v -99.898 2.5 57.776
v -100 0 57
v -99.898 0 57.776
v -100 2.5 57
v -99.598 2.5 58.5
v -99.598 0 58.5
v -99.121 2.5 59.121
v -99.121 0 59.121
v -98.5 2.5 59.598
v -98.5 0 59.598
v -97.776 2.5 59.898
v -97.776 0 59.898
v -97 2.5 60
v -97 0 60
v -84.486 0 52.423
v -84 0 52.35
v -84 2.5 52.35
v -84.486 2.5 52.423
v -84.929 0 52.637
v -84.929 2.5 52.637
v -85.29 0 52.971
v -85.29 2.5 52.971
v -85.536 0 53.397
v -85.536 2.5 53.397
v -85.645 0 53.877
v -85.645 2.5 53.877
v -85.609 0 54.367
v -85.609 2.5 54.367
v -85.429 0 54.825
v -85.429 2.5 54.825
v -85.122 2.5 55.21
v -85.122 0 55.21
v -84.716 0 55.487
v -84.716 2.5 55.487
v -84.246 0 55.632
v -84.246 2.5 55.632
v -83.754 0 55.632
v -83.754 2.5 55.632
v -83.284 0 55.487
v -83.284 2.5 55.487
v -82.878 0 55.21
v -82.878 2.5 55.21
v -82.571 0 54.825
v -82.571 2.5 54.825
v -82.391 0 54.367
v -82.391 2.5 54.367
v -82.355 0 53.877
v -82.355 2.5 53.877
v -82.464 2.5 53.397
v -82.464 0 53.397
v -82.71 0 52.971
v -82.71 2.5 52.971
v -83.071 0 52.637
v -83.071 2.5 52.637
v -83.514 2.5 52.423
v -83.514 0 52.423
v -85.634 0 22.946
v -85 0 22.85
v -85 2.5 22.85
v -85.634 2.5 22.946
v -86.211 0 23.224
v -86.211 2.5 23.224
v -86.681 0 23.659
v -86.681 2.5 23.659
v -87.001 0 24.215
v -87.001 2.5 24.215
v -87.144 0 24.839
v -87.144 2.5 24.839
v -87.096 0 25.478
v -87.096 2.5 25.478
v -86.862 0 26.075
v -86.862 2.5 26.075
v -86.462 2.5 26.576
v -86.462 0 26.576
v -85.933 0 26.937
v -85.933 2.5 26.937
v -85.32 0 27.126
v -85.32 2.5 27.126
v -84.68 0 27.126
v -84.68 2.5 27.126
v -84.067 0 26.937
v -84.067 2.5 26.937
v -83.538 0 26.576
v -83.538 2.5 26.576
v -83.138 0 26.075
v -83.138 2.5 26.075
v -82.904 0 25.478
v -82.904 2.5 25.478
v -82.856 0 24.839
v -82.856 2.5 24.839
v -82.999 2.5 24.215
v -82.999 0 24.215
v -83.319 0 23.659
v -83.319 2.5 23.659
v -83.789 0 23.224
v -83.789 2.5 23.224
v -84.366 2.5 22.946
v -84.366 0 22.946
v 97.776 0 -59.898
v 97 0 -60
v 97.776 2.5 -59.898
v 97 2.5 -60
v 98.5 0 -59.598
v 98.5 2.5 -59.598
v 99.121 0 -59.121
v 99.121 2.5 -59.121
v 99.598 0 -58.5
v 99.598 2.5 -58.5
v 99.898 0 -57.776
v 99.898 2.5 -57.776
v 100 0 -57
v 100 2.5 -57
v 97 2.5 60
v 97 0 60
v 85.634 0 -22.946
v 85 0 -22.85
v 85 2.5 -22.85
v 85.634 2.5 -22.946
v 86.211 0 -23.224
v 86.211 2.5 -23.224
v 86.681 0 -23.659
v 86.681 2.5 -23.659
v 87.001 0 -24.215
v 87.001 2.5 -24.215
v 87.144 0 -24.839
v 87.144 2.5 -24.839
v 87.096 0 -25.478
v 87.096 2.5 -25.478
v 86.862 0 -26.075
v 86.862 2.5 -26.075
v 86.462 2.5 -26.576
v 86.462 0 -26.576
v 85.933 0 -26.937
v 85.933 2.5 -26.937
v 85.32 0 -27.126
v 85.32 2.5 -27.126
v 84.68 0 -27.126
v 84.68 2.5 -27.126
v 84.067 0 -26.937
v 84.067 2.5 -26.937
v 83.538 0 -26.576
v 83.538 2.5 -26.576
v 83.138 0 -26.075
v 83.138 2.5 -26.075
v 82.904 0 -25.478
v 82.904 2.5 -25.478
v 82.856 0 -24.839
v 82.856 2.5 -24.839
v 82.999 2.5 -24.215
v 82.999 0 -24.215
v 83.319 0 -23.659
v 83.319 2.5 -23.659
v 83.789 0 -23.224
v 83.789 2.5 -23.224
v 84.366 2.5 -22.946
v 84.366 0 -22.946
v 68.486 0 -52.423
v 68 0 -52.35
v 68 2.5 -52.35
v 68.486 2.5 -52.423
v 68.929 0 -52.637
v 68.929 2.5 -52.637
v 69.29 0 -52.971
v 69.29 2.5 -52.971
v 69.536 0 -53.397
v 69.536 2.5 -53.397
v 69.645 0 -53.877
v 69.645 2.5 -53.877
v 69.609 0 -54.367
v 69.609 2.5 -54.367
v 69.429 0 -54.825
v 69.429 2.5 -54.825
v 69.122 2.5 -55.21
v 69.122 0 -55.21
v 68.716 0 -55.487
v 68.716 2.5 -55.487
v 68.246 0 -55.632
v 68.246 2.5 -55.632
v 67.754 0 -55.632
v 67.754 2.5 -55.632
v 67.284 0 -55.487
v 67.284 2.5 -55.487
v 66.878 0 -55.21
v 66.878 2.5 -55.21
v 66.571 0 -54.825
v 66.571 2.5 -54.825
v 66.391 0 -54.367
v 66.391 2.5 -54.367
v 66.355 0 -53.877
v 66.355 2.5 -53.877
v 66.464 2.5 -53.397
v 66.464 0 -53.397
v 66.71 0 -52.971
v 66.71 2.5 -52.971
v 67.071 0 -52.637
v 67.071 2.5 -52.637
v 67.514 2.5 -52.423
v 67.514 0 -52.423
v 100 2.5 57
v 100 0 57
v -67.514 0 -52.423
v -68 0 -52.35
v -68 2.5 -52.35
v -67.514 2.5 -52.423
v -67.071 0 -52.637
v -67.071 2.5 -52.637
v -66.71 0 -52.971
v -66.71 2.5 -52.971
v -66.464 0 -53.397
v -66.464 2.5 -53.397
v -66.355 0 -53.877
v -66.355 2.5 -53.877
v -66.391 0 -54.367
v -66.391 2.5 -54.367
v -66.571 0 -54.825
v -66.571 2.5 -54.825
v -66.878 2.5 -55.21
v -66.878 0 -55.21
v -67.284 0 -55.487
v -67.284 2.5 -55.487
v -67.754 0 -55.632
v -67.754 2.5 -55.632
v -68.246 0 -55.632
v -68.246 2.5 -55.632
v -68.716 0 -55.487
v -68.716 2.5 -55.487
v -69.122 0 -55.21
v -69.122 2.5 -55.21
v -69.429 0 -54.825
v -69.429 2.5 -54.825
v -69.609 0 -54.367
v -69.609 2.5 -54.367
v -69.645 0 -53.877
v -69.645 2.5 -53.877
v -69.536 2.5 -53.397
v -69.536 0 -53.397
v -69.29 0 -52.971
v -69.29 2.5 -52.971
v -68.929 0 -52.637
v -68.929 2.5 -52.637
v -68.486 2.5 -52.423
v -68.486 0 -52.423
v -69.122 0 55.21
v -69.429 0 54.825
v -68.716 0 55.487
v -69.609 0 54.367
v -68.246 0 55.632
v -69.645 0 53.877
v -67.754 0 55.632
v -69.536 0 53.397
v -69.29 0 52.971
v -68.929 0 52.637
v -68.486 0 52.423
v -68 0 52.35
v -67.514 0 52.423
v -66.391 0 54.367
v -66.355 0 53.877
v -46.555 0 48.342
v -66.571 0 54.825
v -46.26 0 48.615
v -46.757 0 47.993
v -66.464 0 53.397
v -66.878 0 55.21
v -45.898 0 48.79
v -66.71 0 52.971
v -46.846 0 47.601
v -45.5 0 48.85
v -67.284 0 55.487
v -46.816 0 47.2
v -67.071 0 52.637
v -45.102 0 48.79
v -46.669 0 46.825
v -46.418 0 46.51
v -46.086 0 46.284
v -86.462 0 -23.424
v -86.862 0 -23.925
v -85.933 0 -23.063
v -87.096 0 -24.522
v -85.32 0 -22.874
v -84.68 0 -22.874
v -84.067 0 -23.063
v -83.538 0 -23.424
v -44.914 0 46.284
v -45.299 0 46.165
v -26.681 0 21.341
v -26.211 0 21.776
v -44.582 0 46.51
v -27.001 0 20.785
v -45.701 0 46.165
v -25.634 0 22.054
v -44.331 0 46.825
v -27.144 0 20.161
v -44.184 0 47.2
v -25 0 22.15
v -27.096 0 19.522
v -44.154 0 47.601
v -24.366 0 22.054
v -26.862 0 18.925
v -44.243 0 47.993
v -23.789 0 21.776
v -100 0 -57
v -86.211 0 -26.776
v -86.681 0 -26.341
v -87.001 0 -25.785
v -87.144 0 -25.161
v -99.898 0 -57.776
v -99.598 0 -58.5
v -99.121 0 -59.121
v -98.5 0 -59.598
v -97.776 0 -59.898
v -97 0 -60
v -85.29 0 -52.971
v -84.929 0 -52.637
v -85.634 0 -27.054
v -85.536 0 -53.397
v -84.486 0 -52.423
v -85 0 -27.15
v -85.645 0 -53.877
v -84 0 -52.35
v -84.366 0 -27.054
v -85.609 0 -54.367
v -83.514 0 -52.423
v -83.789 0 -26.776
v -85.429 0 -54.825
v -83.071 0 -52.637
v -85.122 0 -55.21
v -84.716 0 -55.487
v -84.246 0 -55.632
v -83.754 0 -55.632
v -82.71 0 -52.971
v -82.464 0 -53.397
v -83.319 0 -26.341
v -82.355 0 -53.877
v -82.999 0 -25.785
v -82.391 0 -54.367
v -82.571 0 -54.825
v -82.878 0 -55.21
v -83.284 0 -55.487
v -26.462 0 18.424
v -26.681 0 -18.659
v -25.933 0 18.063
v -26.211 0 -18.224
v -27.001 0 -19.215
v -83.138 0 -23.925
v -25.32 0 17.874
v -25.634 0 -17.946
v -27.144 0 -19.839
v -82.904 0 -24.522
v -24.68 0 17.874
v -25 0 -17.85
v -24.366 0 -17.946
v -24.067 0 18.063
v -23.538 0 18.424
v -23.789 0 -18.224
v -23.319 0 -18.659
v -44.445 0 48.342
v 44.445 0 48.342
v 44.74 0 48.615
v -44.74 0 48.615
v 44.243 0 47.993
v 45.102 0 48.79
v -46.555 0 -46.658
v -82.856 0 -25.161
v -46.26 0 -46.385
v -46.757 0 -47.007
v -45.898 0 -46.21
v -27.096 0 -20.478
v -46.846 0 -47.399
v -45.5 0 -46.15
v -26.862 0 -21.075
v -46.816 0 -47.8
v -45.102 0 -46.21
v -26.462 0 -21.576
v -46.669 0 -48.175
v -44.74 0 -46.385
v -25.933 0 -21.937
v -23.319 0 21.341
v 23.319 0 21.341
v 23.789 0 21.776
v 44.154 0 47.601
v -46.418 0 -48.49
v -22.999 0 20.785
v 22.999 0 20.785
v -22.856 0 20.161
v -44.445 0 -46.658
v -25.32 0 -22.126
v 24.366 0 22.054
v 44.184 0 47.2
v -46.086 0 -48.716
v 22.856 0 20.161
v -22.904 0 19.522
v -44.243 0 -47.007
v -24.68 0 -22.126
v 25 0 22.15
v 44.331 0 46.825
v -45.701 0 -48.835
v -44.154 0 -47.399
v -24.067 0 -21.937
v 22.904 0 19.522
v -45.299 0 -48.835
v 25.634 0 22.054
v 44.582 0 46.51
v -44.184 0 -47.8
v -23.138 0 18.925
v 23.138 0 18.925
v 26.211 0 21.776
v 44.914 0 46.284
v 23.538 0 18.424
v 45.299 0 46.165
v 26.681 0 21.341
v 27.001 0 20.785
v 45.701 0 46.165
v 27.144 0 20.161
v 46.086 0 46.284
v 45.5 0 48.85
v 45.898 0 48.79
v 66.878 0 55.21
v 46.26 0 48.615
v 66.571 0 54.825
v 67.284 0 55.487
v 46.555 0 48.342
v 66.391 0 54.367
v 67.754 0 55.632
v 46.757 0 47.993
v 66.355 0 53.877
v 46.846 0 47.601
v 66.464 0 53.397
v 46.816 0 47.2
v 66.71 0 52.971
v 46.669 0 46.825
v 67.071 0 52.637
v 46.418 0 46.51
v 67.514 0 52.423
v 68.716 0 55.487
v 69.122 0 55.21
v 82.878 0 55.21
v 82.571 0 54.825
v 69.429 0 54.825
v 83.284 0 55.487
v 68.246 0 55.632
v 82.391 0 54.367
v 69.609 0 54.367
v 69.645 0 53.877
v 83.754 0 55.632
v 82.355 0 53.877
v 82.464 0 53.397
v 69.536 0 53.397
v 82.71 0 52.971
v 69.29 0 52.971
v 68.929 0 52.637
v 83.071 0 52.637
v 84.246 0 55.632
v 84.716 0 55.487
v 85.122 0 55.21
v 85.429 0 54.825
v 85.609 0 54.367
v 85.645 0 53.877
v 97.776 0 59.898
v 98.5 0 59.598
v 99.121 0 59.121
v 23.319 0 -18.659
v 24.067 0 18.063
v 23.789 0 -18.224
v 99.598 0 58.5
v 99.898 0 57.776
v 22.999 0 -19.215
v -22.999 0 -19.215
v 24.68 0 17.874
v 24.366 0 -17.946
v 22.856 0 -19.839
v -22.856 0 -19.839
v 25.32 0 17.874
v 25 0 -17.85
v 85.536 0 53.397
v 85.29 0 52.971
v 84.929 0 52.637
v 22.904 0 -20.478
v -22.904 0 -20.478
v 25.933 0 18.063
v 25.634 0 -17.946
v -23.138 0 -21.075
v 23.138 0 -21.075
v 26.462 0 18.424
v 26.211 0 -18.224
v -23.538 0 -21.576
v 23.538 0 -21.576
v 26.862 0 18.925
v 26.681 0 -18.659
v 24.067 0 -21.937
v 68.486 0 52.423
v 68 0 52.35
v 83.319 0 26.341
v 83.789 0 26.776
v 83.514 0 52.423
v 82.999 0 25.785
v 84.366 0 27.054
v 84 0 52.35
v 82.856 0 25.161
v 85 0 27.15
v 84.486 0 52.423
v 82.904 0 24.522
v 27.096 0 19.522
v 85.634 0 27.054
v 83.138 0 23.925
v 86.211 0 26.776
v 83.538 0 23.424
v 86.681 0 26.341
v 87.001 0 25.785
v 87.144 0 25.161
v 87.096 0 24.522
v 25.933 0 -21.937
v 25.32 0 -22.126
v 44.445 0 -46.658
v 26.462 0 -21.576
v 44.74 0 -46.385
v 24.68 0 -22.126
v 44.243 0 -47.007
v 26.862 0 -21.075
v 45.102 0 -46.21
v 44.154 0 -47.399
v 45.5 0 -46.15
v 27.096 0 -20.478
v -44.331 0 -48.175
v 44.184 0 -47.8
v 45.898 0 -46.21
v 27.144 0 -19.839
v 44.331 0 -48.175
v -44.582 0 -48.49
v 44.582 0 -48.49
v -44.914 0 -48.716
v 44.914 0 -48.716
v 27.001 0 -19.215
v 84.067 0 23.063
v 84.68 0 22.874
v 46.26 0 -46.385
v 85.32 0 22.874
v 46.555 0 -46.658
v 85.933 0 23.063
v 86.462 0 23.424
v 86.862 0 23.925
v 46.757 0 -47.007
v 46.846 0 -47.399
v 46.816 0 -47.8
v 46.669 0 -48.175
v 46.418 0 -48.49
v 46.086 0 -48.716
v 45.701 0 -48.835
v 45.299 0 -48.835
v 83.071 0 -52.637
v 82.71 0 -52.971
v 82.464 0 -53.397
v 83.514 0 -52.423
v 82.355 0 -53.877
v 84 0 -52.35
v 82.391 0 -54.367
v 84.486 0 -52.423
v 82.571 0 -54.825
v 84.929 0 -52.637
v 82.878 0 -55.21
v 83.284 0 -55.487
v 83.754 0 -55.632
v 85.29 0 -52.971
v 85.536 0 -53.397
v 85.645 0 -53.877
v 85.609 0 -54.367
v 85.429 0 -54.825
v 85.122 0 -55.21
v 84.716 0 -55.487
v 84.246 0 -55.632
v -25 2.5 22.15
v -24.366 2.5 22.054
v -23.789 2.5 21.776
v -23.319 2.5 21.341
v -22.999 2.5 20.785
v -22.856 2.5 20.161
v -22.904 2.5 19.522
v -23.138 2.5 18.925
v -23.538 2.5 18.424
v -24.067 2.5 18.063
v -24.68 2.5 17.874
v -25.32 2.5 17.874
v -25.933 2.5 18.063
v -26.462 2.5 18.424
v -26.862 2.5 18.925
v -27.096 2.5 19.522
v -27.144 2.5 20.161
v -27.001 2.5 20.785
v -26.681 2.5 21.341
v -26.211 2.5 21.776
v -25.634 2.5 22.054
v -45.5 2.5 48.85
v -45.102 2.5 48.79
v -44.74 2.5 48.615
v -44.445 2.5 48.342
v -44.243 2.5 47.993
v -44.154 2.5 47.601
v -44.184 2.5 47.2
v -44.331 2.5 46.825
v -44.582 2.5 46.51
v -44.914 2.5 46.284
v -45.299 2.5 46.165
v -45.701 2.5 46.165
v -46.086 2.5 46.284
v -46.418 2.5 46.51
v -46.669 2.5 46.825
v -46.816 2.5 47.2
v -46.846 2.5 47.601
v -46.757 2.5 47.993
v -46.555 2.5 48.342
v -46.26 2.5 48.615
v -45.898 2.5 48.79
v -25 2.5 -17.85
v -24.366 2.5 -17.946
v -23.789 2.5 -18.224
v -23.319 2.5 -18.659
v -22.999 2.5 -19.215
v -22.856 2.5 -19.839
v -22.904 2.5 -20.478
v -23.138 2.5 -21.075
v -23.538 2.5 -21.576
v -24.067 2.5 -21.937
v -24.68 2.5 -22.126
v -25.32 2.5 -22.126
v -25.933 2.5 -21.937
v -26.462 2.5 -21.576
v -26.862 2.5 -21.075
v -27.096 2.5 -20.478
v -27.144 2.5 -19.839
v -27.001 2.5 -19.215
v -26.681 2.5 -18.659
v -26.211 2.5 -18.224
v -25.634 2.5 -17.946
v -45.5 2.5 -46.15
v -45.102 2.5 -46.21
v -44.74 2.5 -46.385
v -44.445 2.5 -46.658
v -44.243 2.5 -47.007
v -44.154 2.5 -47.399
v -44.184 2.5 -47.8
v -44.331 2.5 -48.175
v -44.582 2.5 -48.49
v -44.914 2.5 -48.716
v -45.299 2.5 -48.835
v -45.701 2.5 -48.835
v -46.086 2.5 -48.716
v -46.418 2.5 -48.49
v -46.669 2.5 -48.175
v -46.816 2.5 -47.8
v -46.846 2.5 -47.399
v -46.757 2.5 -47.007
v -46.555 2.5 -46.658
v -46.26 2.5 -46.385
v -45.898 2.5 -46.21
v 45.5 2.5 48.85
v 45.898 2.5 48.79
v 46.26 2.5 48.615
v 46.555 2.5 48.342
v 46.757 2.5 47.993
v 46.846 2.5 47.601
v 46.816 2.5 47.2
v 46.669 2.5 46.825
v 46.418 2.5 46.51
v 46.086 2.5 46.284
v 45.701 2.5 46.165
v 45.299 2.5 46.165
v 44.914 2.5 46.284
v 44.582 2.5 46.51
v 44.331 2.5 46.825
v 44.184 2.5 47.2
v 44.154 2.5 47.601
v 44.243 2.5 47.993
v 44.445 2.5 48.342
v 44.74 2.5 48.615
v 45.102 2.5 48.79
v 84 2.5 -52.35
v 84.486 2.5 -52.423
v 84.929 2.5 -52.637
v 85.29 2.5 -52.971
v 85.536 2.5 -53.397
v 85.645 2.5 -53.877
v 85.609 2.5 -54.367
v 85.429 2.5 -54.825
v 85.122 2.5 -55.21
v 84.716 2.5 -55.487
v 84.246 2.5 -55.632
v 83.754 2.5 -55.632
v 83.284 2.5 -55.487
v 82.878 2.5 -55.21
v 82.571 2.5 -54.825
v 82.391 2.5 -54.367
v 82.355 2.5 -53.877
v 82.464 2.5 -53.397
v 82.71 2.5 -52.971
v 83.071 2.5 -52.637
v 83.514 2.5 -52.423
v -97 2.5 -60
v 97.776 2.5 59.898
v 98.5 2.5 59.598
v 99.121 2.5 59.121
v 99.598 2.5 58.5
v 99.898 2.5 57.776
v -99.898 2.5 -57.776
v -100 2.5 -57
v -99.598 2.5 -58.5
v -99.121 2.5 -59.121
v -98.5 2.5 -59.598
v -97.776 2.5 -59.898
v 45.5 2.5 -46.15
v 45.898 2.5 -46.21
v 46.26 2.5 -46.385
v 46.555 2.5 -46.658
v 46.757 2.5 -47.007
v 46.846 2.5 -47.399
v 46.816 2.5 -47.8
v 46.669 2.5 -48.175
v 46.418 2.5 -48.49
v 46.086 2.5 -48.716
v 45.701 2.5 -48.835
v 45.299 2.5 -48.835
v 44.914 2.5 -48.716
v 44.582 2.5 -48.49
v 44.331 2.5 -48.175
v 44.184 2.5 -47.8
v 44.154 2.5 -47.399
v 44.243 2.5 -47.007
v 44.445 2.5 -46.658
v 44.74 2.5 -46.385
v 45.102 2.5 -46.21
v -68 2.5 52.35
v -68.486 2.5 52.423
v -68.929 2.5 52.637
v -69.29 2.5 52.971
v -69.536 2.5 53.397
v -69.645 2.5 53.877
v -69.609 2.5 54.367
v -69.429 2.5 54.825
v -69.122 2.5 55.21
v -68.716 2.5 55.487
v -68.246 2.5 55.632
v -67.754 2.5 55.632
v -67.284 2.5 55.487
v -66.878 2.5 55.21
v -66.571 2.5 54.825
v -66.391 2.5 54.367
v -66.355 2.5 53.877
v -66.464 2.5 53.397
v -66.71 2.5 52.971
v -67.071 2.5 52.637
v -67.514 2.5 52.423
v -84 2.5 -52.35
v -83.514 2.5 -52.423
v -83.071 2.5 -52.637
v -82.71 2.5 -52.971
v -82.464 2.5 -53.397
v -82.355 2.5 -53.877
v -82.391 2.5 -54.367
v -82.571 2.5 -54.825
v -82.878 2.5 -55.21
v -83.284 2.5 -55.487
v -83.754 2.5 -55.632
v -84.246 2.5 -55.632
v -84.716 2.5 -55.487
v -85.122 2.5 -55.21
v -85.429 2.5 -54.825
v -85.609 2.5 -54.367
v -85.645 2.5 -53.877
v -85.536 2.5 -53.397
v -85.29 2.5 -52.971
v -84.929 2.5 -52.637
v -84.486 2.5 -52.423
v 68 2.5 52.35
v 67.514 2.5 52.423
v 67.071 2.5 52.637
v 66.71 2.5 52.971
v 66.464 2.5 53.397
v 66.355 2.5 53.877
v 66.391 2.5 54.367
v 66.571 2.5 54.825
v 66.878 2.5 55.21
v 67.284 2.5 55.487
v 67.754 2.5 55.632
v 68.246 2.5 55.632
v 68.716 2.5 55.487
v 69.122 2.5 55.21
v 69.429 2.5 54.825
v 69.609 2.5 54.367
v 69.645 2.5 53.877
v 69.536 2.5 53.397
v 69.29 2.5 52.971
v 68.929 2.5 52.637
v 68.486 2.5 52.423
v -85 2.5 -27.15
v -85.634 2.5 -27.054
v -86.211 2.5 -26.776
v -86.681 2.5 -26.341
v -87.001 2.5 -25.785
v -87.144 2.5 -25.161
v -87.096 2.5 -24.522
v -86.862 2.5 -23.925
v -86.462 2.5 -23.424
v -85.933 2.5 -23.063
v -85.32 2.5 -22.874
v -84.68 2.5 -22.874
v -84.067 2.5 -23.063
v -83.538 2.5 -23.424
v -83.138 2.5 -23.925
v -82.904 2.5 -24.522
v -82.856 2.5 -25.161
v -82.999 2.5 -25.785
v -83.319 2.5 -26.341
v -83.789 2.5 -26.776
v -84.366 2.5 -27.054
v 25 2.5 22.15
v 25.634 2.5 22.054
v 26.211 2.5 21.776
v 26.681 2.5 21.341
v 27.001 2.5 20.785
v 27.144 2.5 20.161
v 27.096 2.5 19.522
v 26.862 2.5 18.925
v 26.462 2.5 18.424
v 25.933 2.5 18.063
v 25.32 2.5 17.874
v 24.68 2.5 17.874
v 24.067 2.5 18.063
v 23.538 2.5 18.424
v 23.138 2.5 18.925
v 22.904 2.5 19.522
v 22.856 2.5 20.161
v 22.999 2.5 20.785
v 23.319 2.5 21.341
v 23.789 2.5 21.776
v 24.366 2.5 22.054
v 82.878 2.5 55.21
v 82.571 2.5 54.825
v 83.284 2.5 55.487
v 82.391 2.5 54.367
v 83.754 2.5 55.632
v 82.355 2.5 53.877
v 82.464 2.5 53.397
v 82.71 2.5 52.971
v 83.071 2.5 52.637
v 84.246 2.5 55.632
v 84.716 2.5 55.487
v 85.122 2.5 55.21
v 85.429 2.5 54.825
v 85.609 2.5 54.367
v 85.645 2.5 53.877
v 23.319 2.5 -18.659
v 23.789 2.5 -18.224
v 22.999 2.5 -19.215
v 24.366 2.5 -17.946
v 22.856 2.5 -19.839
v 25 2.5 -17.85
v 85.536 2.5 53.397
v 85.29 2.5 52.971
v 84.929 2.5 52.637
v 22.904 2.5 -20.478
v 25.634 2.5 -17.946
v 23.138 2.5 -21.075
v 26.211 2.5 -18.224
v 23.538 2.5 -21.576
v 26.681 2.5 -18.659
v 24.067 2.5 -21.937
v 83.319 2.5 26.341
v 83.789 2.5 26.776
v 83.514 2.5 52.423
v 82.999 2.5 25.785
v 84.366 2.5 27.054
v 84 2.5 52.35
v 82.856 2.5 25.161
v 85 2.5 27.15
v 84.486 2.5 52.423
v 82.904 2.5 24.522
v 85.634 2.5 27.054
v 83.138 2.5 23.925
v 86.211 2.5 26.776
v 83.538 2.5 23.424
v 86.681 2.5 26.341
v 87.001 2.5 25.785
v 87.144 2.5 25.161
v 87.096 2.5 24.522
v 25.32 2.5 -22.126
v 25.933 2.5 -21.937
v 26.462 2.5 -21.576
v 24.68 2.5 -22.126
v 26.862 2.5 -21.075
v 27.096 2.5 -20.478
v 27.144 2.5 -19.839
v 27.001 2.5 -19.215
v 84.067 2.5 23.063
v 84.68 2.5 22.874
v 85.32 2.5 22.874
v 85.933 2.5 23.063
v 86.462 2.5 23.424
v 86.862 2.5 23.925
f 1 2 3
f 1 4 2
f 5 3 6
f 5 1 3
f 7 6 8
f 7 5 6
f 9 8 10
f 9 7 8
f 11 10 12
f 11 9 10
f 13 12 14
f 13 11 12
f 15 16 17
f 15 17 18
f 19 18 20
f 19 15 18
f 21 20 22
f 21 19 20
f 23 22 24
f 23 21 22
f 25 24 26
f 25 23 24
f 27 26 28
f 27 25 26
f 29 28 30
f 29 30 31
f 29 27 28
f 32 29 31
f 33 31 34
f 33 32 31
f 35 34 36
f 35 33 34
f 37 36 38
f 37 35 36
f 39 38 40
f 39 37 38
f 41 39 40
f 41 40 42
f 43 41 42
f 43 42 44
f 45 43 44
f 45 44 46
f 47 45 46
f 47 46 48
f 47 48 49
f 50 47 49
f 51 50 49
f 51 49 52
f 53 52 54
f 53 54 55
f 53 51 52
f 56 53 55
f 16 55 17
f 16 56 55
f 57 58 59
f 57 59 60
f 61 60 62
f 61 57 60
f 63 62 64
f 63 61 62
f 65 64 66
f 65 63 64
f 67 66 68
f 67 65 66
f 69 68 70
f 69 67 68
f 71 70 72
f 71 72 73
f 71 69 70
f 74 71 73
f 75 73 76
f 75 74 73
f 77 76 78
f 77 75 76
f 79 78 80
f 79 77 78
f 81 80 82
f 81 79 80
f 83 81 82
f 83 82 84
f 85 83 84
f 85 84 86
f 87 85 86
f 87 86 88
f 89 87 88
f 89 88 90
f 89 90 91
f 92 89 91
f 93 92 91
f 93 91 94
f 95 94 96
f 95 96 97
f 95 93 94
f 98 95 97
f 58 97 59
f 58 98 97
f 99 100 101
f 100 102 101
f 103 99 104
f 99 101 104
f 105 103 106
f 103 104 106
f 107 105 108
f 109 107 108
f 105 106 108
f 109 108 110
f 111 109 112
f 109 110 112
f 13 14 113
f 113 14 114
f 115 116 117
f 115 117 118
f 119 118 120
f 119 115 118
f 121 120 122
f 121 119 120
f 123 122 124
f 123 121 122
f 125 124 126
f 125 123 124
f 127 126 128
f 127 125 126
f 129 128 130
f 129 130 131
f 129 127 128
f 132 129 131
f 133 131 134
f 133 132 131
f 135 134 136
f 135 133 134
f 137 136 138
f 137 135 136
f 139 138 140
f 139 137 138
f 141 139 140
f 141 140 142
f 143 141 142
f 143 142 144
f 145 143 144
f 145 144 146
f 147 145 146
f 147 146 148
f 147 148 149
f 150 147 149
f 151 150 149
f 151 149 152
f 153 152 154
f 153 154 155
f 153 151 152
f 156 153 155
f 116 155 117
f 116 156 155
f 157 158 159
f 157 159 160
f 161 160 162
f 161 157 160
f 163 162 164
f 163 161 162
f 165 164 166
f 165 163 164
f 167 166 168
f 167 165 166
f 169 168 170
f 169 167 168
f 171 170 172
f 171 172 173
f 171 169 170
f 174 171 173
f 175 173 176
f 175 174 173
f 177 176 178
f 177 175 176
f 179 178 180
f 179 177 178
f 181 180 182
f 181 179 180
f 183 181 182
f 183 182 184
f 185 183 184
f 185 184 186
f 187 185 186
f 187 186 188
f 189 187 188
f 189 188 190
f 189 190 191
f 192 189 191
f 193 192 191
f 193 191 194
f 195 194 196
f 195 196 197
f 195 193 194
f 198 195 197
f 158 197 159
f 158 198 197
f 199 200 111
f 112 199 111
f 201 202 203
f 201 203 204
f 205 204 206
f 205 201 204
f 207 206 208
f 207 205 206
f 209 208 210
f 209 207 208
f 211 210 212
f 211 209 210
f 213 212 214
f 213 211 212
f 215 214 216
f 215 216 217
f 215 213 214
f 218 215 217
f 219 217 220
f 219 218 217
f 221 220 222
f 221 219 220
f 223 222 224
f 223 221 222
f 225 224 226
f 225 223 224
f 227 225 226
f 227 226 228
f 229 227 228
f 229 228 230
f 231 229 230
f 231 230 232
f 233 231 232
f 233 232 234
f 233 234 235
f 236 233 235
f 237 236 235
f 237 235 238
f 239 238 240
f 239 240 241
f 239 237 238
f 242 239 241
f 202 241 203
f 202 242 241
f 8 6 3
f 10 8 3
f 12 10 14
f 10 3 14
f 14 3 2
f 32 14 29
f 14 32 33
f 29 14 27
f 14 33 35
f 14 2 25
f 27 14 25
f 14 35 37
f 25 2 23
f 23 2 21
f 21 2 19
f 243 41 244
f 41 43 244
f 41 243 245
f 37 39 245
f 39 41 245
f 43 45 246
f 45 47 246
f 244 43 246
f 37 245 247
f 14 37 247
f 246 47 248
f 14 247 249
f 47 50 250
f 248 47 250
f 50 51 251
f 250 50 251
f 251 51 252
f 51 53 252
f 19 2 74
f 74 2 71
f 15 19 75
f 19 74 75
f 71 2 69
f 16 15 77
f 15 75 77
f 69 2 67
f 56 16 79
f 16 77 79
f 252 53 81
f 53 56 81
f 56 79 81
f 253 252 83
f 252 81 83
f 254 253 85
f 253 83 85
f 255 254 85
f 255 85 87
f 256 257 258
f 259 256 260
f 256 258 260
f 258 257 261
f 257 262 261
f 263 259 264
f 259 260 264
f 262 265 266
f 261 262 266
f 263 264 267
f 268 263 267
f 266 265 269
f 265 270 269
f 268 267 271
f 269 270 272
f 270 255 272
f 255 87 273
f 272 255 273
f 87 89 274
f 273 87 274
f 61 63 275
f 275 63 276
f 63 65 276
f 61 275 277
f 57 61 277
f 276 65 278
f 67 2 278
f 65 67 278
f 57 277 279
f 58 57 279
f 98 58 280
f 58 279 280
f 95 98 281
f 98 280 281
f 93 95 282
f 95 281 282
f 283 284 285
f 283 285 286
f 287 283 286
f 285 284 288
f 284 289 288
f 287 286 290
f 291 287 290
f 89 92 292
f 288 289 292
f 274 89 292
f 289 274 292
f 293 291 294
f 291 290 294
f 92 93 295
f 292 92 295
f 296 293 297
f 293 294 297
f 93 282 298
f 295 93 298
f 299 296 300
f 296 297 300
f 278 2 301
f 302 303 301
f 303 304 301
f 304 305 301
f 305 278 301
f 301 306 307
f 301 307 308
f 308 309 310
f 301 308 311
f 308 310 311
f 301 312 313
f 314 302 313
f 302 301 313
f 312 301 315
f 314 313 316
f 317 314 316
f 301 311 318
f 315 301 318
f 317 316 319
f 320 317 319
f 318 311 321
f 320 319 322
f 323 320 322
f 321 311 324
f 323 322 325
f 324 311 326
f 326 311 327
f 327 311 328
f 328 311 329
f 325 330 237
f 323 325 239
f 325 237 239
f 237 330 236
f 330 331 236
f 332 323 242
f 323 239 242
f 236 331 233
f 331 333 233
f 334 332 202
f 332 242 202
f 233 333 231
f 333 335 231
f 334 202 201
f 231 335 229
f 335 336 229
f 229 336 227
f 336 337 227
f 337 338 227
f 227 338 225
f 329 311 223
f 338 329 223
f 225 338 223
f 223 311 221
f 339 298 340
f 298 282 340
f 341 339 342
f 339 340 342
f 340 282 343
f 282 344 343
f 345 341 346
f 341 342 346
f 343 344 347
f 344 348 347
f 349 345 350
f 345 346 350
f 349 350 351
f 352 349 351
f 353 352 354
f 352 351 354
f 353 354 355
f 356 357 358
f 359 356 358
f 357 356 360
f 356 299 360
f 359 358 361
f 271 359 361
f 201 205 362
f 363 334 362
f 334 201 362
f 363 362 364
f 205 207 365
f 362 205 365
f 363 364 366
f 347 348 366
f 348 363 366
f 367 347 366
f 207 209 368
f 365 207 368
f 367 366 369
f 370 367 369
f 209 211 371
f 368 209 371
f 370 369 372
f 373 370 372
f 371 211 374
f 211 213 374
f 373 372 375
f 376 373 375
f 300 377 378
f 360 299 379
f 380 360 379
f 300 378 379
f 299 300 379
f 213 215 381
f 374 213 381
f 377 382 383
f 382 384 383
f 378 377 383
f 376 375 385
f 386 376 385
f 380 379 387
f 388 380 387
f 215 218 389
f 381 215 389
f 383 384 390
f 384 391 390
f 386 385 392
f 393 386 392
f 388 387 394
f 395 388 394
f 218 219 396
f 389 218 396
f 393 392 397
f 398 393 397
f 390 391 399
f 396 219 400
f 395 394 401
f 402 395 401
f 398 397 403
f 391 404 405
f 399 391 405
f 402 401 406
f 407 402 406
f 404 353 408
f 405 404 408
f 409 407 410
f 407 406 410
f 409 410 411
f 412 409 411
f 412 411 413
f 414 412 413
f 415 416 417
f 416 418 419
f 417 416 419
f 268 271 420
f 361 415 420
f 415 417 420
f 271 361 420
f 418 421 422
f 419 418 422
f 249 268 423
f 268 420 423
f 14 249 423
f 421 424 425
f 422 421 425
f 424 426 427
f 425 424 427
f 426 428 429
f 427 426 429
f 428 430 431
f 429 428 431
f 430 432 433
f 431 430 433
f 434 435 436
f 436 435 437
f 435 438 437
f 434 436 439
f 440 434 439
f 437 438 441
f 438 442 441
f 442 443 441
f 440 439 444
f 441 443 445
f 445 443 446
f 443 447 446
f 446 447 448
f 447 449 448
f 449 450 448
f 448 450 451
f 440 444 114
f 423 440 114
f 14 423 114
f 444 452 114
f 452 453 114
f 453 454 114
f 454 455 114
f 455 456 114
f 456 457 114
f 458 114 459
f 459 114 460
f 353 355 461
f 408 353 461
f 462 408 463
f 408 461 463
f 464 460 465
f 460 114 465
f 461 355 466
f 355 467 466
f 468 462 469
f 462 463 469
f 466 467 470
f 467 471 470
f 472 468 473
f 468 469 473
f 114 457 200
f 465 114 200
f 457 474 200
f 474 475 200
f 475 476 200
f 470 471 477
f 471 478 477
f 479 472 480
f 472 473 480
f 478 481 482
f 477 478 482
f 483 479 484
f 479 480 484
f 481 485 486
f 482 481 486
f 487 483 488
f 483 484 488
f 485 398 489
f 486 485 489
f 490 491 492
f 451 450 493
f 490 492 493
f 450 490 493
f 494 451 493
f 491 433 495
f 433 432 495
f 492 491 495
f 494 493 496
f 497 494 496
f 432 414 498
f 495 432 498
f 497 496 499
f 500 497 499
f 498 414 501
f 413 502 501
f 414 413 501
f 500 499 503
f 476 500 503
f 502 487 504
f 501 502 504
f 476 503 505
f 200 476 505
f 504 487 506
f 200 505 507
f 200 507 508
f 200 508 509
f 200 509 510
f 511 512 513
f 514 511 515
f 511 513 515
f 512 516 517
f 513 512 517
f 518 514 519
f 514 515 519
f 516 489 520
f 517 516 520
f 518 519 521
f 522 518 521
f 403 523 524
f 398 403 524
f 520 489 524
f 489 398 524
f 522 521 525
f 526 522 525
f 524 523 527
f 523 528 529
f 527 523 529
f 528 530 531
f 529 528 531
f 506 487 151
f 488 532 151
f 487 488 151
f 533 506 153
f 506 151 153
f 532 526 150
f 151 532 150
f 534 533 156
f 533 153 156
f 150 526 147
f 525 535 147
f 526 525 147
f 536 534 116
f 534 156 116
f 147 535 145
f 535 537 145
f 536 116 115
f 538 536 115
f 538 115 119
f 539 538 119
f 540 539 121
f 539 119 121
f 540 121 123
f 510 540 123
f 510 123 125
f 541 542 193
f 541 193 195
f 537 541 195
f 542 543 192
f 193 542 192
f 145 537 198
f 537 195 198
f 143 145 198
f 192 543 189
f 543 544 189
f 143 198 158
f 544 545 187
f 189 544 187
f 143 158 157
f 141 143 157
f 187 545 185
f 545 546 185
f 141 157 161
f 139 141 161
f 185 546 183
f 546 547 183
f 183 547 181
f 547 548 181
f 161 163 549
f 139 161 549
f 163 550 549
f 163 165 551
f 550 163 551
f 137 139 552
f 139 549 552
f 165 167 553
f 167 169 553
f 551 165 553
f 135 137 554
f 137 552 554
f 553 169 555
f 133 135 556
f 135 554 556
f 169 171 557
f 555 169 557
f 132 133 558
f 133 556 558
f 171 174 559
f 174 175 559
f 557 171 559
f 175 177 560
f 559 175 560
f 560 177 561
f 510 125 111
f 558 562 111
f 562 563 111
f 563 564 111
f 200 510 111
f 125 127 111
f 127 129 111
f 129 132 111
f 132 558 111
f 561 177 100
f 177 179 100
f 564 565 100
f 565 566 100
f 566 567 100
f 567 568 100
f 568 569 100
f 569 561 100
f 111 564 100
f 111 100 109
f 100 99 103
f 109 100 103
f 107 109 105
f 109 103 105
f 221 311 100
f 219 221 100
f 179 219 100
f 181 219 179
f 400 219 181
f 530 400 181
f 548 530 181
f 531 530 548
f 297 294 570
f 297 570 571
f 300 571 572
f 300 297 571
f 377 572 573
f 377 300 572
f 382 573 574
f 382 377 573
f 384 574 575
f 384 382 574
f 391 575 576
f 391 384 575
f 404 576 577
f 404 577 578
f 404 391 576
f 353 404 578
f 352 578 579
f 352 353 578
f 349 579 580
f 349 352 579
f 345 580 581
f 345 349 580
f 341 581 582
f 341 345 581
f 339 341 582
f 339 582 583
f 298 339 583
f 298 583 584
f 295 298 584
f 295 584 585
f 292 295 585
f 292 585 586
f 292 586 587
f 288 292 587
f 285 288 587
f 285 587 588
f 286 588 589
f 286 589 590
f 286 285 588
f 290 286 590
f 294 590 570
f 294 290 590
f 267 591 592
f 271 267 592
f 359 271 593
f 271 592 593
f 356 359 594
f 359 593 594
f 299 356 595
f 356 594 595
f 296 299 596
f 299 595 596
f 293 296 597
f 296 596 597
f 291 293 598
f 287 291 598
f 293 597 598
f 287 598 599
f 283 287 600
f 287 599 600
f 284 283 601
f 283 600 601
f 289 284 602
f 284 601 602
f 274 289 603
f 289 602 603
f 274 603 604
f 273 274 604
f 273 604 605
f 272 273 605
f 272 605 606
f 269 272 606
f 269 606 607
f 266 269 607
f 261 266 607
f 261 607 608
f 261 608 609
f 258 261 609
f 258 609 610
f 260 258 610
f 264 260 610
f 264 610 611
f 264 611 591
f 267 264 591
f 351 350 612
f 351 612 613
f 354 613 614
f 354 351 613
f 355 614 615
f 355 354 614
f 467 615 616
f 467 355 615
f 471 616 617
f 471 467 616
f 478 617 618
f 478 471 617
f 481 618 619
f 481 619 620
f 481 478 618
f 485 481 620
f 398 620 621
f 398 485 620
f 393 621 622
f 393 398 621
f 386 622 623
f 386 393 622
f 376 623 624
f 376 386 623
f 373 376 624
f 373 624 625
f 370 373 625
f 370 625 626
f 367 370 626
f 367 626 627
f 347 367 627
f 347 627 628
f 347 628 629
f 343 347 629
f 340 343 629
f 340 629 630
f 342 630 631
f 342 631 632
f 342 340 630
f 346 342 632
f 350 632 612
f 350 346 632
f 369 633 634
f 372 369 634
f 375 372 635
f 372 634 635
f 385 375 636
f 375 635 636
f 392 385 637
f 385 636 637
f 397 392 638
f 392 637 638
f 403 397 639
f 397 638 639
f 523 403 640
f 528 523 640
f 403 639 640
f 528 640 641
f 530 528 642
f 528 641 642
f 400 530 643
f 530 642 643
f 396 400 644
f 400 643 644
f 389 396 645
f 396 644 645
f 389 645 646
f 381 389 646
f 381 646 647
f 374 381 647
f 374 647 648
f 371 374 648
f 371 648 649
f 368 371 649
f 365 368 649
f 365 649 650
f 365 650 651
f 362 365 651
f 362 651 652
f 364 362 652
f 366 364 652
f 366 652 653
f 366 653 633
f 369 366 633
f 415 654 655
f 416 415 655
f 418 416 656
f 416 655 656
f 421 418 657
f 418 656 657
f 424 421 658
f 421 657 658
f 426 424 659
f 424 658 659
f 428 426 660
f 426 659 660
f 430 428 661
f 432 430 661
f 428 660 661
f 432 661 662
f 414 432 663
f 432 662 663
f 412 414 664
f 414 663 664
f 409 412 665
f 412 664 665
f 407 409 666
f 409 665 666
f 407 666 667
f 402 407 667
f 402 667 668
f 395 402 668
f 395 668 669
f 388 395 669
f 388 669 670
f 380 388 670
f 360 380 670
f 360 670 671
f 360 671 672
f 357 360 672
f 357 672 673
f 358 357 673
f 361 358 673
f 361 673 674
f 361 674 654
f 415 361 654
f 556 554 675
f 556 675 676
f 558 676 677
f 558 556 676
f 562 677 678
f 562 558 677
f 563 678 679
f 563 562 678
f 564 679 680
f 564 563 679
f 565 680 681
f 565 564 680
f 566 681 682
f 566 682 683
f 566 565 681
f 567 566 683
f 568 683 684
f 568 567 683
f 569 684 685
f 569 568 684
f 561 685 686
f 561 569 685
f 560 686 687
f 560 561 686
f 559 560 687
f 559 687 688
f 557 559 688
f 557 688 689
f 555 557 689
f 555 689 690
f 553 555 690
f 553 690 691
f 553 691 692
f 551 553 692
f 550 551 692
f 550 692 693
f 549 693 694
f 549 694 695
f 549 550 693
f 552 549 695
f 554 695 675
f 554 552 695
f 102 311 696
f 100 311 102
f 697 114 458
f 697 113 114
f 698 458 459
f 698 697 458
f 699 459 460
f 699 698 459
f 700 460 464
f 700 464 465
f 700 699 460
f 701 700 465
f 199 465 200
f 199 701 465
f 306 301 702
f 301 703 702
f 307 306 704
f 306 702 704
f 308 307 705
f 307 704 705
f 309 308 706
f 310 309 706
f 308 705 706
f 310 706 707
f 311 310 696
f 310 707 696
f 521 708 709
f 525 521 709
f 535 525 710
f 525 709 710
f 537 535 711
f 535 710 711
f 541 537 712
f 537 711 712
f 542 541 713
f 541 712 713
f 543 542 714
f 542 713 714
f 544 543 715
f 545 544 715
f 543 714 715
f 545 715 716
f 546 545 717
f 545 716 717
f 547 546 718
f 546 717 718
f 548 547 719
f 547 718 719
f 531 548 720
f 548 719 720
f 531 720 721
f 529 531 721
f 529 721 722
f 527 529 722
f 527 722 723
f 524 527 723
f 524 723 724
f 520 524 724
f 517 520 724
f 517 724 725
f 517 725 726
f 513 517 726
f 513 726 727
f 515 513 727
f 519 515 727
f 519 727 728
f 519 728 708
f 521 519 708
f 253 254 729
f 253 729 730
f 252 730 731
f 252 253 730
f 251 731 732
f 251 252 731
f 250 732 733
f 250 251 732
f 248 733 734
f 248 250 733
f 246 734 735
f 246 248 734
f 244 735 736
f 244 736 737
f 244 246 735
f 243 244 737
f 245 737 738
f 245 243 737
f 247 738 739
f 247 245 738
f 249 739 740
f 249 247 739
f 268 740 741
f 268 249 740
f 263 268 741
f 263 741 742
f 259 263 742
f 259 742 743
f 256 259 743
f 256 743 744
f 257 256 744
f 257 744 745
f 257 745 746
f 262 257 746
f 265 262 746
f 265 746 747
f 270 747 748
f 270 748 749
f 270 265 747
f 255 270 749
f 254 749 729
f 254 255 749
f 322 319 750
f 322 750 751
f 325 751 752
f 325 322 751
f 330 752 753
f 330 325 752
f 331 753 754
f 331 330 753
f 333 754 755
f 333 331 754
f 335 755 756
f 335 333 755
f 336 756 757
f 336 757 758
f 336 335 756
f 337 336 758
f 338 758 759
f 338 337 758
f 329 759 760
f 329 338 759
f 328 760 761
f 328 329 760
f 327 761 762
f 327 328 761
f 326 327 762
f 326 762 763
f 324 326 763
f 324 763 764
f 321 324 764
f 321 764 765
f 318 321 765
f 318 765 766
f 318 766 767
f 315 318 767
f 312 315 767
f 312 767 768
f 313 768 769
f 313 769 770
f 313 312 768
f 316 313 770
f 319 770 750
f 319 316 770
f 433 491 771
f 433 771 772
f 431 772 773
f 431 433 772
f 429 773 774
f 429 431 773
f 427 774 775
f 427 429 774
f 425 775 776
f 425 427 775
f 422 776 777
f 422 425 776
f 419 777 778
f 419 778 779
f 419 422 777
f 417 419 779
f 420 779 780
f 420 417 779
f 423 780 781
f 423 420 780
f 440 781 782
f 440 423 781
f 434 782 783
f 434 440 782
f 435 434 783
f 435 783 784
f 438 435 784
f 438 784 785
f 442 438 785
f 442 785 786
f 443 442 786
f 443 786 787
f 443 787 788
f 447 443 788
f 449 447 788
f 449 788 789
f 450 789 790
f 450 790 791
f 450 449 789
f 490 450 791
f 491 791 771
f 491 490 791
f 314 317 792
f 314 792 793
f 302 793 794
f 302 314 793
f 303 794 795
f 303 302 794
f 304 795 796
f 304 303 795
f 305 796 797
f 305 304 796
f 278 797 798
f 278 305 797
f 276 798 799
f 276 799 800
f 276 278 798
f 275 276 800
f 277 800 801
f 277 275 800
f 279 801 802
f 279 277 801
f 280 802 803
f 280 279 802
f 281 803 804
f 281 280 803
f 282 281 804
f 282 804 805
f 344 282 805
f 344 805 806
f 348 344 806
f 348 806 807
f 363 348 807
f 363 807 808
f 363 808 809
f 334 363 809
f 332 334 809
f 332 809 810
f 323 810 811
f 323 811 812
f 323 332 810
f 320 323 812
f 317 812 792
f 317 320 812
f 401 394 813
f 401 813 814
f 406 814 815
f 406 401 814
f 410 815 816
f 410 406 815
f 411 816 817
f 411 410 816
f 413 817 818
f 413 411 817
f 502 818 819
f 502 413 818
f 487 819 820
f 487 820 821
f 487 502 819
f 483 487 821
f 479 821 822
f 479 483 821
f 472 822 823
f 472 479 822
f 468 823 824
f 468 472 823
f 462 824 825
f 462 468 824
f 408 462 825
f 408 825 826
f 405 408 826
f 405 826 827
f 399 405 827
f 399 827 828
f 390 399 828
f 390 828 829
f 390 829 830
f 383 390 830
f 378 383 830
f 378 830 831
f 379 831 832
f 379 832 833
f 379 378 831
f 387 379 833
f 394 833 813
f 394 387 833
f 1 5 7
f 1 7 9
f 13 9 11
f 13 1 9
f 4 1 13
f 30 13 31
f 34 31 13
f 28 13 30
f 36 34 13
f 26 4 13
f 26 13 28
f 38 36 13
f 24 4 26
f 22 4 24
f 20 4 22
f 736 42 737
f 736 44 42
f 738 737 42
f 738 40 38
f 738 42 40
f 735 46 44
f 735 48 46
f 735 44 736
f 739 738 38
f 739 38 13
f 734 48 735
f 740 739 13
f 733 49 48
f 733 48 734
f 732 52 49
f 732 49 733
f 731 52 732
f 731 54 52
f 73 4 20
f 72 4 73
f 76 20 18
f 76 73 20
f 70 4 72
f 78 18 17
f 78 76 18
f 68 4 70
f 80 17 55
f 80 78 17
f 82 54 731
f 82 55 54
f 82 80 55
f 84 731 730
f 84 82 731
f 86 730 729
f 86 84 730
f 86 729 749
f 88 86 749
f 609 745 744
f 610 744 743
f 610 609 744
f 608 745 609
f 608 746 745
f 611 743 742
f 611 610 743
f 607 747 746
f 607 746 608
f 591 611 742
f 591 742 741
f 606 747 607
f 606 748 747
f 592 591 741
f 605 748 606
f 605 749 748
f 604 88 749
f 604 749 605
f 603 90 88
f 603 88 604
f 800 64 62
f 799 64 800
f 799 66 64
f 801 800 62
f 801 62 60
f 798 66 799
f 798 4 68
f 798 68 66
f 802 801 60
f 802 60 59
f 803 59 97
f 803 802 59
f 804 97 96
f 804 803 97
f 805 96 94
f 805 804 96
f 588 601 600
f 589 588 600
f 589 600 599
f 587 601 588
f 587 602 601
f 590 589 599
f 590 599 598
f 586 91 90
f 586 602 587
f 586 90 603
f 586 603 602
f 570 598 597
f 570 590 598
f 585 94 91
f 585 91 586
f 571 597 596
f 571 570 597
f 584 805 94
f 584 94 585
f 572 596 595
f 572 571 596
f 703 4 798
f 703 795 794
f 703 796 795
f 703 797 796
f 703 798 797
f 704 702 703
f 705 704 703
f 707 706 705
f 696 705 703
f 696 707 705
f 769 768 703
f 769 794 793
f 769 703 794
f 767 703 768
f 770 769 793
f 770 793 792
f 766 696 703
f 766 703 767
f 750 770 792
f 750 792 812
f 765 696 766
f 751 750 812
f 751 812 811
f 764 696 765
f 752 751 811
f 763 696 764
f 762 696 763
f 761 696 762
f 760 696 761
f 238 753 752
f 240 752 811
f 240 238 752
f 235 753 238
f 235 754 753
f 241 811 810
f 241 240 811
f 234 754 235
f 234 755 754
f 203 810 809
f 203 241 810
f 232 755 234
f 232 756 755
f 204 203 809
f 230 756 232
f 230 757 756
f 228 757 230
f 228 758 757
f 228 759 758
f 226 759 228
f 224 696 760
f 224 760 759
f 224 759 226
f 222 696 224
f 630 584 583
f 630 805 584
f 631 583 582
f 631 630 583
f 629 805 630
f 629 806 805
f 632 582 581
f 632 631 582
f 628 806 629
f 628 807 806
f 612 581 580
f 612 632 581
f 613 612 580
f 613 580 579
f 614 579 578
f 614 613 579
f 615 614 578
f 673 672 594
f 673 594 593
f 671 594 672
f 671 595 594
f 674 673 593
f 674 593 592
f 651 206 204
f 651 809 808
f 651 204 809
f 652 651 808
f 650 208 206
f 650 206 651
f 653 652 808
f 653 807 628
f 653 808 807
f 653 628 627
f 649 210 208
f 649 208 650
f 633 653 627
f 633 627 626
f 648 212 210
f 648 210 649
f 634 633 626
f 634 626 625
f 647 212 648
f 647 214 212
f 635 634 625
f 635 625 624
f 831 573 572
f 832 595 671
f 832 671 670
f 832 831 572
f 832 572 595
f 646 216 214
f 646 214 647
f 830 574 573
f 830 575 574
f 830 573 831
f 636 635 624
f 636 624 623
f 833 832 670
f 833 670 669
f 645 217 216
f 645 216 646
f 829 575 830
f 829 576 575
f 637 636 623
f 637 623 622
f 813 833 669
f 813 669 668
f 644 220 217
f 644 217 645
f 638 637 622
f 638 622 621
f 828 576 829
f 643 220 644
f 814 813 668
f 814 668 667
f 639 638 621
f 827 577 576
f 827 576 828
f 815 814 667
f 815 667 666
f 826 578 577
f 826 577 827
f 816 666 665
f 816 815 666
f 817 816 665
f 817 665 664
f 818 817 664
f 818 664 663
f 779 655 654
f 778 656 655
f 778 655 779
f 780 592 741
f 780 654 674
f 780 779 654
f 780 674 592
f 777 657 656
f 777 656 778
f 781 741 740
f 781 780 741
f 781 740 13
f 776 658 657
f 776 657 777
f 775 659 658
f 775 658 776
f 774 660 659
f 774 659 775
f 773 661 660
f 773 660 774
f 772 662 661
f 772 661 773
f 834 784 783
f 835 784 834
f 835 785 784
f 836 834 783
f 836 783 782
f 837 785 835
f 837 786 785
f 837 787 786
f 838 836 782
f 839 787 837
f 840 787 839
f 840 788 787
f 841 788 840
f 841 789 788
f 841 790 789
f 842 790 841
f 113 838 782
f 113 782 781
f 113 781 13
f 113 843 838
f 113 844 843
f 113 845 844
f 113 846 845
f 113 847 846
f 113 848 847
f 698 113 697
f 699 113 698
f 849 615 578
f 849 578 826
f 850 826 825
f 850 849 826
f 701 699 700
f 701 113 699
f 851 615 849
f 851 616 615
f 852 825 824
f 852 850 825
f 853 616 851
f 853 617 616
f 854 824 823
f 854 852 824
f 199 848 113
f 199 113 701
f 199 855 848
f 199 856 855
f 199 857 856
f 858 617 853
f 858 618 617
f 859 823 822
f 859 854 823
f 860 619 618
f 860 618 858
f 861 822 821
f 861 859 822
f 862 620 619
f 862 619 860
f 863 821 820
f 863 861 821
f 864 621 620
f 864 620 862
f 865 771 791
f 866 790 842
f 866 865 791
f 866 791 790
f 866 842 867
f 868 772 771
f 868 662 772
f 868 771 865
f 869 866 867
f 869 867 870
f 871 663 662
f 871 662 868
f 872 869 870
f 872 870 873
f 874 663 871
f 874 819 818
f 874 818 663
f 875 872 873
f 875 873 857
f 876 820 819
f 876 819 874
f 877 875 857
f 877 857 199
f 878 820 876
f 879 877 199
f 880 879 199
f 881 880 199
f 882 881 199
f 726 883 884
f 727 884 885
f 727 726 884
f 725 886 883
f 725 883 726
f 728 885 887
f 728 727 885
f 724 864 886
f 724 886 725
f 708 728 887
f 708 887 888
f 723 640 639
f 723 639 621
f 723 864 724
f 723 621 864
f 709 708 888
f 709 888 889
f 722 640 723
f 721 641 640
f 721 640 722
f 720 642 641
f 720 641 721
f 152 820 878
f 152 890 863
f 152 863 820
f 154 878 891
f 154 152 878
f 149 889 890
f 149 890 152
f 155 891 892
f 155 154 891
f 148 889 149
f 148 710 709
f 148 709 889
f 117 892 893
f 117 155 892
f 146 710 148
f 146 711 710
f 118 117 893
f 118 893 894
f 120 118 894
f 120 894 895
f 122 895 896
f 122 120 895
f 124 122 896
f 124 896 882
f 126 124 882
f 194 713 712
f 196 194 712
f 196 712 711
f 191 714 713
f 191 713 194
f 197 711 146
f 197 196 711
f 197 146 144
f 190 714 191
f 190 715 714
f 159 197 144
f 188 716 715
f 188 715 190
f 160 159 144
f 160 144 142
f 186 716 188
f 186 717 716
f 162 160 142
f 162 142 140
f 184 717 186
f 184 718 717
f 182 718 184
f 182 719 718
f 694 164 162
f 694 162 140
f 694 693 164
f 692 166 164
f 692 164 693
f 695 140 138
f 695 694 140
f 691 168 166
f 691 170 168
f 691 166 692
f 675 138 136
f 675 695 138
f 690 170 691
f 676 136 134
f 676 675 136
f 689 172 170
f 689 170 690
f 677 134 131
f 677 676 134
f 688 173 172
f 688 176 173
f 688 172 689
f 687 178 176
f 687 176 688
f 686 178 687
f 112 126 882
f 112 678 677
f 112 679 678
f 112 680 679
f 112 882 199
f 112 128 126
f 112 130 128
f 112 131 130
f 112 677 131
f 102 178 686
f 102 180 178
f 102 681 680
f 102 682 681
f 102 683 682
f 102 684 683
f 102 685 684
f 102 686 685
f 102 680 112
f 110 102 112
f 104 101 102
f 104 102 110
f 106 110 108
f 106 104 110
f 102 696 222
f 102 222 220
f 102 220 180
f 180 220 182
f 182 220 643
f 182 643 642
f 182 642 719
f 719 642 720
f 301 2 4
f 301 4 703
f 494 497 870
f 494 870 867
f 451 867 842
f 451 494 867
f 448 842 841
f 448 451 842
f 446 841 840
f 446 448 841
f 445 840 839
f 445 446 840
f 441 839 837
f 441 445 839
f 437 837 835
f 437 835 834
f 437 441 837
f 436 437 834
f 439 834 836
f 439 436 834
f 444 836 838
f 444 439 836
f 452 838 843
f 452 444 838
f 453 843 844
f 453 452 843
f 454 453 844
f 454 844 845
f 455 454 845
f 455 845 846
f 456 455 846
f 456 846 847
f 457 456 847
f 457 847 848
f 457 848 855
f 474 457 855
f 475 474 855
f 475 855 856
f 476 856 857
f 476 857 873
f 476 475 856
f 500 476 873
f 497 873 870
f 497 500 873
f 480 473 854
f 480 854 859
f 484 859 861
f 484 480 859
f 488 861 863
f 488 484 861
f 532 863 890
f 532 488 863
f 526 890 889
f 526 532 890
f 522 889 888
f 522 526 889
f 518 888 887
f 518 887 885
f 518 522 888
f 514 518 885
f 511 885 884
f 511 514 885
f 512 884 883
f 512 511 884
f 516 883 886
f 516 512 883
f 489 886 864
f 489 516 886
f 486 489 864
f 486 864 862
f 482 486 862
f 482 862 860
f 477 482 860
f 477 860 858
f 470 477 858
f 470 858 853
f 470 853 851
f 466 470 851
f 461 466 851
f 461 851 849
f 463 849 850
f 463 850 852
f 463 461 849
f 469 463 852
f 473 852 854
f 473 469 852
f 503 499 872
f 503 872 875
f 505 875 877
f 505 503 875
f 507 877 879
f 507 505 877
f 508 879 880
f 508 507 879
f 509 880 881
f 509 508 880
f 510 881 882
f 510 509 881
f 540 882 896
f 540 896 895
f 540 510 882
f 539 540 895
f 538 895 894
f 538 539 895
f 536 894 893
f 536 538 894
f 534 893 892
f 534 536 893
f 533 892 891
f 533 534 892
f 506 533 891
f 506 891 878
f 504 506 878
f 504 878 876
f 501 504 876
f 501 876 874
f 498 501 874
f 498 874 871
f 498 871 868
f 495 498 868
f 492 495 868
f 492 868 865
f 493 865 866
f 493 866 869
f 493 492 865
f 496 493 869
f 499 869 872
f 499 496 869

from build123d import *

# Parameters (mm, degrees)
SKETCH_1_W          = 200
SKETCH_1_H          = 120
SKETCH_1_R          = 1.65
SKETCH_1_R_2        = 2.15
EXTRUDE_2_DEPTH     = 2.5
CUT_EXTRUDE_1_REACH = 118.646
SKETCH_2_R          = 1.35
FILLET_1_R          = 3


with BuildPart() as part:
    # 草圖1 → 填料-伸長2 (new body)
    with BuildSketch(Plane(origin=(0, 0, 0), x_dir=(1, 0, 0), z_dir=(0, 1, 0))):
        Rectangle(SKETCH_1_W, SKETCH_1_H)
        with Locations(Location((-84, 54, 0), (0, 0, 270))):
            Circle(SKETCH_1_R, mode=Mode.SUBTRACT)
        with Locations(Location((-68, 54, 0), (0, 0, 270))):
            Circle(SKETCH_1_R, mode=Mode.SUBTRACT)
        with Locations(Location((68, 54, 0), (0, 0, 270))):
            Circle(SKETCH_1_R, mode=Mode.SUBTRACT)
        with Locations(Location((84, 54, 0), (0, 0, 270))):
            Circle(SKETCH_1_R, mode=Mode.SUBTRACT)
        with Locations(Location((84, -54, 0), (0, 0, 90))):
            Circle(SKETCH_1_R, mode=Mode.SUBTRACT)
        with Locations(Location((68, -54, 0), (0, 0, 90))):
            Circle(SKETCH_1_R, mode=Mode.SUBTRACT)
        with Locations(Location((-68, -54, 0), (0, 0, 90))):
            Circle(SKETCH_1_R, mode=Mode.SUBTRACT)
        with Locations(Location((-84, -54, 0), (0, 0, 90))):
            Circle(SKETCH_1_R, mode=Mode.SUBTRACT)
        with Locations(Location((25, 20, 0), (0, 0, 270))):
            Circle(SKETCH_1_R_2, mode=Mode.SUBTRACT)
        with Locations(Location((-25, 20, 0), (0, 0, 270))):
            Circle(SKETCH_1_R_2, mode=Mode.SUBTRACT)
        with Locations(Location((-25, -20, 0), (0, 0, 270))):
            Circle(SKETCH_1_R_2, mode=Mode.SUBTRACT)
        with Locations(Location((25, -20, 0), (0, 0, 270))):
            Circle(SKETCH_1_R_2, mode=Mode.SUBTRACT)
        with Locations(Location((85, 25, 0), (0, 0, 270))):
            Circle(SKETCH_1_R_2, mode=Mode.SUBTRACT)
        with Locations(Location((85, -25, 0), (0, 0, 270))):
            Circle(SKETCH_1_R_2, mode=Mode.SUBTRACT)
        with Locations(Location((-85, -25, 0), (0, 0, 90))):
            Circle(SKETCH_1_R_2, mode=Mode.SUBTRACT)
        with Locations(Location((-85, 25, 0), (0, 0, 90))):
            Circle(SKETCH_1_R_2, mode=Mode.SUBTRACT)
    extrude(amount=EXTRUDE_2_DEPTH)

    # 草圖2 → 除料-伸長1 (cut, up to next)
    with BuildSketch(Plane(origin=(0, 2.5, 0), x_dir=(1, 0, 0), z_dir=(0, 1, 0)), mode=Mode.PRIVATE) as cut_extrude_1_sk1:
        with Locations(Location((-45.5, 47.5, 0), (0, 0, 270))):
            Circle(SKETCH_2_R)
    cut_extrude_1_tool1 = extrude(cut_extrude_1_sk1.sketch, amount=-CUT_EXTRUDE_1_REACH, mode=Mode.PRIVATE) & part.part
    # 草圖2 → 除料-伸長1 (cut, up to next)
    with BuildSketch(Plane(origin=(0, 2.5, 0), x_dir=(1, 0, 0), z_dir=(0, 1, 0)), mode=Mode.PRIVATE) as cut_extrude_1_sk2:
        with Locations(Location((45.5, 47.5, 0), (0, 0, 270))):
            Circle(SKETCH_2_R)
    cut_extrude_1_tool2 = extrude(cut_extrude_1_sk2.sketch, amount=-CUT_EXTRUDE_1_REACH, mode=Mode.PRIVATE) & part.part
    # 草圖2 → 除料-伸長1 (cut, up to next)
    with BuildSketch(Plane(origin=(0, 2.5, 0), x_dir=(1, 0, 0), z_dir=(0, 1, 0)), mode=Mode.PRIVATE) as cut_extrude_1_sk3:
        with Locations(Location((-45.5, -47.5, 0), (0, 0, 270))):
            Circle(SKETCH_2_R)
    cut_extrude_1_tool3 = extrude(cut_extrude_1_sk3.sketch, amount=-CUT_EXTRUDE_1_REACH, mode=Mode.PRIVATE) & part.part
    # 草圖2 → 除料-伸長1 (cut, up to next)
    with BuildSketch(Plane(origin=(0, 2.5, 0), x_dir=(1, 0, 0), z_dir=(0, 1, 0)), mode=Mode.PRIVATE) as cut_extrude_1_sk4:
        with Locations(Location((45.5, -47.5, 0), (0, 0, 270))):
            Circle(SKETCH_2_R)
    cut_extrude_1_tool4 = extrude(cut_extrude_1_sk4.sketch, amount=-CUT_EXTRUDE_1_REACH, mode=Mode.PRIVATE) & part.part
    add(cut_extrude_1_tool1.solids().sort_by_distance((-45.5, 2.5, -47.5))[0], mode=Mode.SUBTRACT)
    add(cut_extrude_1_tool2.solids().sort_by_distance((45.5, 2.5, -47.5))[0], mode=Mode.SUBTRACT)
    add(cut_extrude_1_tool3.solids().sort_by_distance((-45.5, 2.5, 47.5))[0], mode=Mode.SUBTRACT)
    add(cut_extrude_1_tool4.solids().sort_by_distance((45.5, 2.5, 47.5))[0], mode=Mode.SUBTRACT)

    # 圓角1
    fillet_1_edges = [part.edges().sort_by_distance(p)[0] for p in [
        (-100, 1.25, -60),
        (100, 1.25, -60),
        (100, 1.25, 60),
        (-100, 1.25, 60),
    ]]
    fillet(fillet_1_edges, radius=FILLET_1_R)


solid = part.part
